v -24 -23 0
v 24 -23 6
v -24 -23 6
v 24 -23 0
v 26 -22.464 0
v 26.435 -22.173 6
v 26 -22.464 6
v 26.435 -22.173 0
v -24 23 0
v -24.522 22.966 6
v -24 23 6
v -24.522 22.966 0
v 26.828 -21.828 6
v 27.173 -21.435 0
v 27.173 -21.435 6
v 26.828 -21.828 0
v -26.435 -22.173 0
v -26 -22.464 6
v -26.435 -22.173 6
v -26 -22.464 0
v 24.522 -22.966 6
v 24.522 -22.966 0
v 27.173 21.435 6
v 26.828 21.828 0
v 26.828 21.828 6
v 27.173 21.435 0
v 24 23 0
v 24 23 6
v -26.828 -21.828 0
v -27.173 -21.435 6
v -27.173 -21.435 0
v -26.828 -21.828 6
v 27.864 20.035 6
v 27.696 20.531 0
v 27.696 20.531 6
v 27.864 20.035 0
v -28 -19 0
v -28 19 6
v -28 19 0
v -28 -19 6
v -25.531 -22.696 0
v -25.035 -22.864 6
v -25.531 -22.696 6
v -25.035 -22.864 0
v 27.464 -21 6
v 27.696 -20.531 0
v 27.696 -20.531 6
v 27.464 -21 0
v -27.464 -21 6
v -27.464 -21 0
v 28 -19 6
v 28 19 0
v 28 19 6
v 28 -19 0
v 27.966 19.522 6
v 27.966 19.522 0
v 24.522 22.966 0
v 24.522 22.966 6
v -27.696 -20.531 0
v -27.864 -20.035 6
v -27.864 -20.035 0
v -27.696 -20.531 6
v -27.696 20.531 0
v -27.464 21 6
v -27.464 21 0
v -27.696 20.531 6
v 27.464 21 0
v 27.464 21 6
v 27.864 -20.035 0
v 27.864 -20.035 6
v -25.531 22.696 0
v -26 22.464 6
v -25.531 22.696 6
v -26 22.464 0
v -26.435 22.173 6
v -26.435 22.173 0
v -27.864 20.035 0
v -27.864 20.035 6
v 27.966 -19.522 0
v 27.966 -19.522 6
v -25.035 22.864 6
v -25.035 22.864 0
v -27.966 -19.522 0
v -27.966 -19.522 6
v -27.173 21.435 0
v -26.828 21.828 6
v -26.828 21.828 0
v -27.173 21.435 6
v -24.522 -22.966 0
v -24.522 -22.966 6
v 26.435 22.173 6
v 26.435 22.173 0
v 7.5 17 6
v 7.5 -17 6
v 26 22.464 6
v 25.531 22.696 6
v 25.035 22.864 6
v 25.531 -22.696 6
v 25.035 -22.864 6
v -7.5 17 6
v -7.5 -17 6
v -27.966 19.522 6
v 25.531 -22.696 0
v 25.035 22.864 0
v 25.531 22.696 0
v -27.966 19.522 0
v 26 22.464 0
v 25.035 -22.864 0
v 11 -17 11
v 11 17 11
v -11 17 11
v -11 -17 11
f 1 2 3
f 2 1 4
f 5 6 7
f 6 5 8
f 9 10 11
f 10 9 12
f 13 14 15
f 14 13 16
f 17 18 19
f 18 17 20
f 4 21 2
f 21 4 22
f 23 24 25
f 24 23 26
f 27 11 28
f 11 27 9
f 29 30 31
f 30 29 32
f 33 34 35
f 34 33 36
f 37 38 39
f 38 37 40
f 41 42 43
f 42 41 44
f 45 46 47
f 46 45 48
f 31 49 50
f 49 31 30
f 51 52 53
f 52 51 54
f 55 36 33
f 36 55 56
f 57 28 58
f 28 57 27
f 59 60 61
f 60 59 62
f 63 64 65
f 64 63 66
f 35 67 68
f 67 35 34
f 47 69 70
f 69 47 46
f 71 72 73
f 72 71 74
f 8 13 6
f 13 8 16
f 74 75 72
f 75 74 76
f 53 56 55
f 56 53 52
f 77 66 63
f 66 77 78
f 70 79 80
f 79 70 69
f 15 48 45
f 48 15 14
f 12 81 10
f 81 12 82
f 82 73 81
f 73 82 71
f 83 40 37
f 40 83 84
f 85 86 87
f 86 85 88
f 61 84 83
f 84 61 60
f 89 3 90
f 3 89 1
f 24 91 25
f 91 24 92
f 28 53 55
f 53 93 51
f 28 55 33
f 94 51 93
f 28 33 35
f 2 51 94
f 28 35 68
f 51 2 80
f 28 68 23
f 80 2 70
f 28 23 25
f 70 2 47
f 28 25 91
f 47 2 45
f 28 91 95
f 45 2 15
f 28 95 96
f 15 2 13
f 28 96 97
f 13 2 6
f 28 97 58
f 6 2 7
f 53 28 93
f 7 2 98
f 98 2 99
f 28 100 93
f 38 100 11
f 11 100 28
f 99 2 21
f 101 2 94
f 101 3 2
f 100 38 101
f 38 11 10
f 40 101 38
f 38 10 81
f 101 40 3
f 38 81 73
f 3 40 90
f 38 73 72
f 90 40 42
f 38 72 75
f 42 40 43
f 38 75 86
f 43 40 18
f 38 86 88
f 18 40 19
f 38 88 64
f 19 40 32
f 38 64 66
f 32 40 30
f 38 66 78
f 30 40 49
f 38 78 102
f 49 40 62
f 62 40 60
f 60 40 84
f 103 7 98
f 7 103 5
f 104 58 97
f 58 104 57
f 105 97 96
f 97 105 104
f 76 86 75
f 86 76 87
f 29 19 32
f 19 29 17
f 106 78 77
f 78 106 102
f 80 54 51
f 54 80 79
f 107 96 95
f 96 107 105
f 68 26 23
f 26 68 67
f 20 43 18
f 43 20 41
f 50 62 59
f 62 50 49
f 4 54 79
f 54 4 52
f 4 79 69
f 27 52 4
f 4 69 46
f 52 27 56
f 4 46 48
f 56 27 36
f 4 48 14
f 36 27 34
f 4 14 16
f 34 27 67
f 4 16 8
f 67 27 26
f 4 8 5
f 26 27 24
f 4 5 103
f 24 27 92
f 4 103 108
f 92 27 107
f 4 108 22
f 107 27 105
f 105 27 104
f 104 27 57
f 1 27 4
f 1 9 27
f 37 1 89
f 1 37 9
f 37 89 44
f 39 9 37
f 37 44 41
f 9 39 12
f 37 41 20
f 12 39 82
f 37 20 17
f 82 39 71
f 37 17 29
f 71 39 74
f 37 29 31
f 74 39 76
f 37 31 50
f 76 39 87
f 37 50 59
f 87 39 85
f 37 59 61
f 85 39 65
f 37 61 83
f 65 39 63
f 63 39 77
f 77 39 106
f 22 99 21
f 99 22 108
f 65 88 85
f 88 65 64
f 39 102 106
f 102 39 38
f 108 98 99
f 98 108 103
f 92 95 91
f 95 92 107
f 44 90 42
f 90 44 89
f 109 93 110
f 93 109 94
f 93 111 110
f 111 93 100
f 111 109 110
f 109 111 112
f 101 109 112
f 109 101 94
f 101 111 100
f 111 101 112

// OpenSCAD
// file: dovetail.scad
/*
  dovetail.scad - the male/female interface, defined ONCE.

  ---------------------------------------------------------------------------
  ★ WHY THIS FILE EXISTS

  These constants are needed by two files: mount.scad makes the male, case.scad
  cuts the female. They must agree exactly or the parts do not fit.

  They used to live in mount.scad, which case.scad pulled in with `use`. That
  does not work, and it fails SILENTLY:

    - `use` imports modules but NOT variables. So `dt_h` read from case.scad is
      undef, and any arithmetic on it silently produces nonsense.
    - Worse, case.scad can declare its own dt_* variables in the same
      namespace. A maintainer "documenting the dovetail" in case.scad gets a
      file that reads correctly, renders without a warning, and is wrong. That
      was tested: setting dt_h = 12 in case.scad left the slot cut at 6.0.

  A dimensional audit named this as the highest-risk drift pair in the project.
  So the constants live here, both files `include` this, and there is exactly
  one place to change them.

  ★ NEVER copy a value out of this file into another one. Include it.
*/

// ============================================================ CONSTANTS

/*
  ★ NARROWED from 26/34/6 after a review found the mount plate lid screws
  breaking into the slot: at dt_top 34 the slot half-width was 17.3 while the
  screws inner edge sat at 16.3 - a 1.0 mm intersection, on four screws.

  15/22 over 5 gives a slot half-width of 11.55 and 4.75 mm of clearance. The
  flank is atan(5 / 3.5) = 55 degrees, still self-supporting, and the joint is
  hugely overbuilt either way - a structural review put the dovetail root at
  SF 20 in the direction that matters.
*/
dt_base   = 15.0;   // narrow face, against the plate
dt_top    = 22.0;   // wide face - the part that cannot be pulled straight out
dt_h      = 5.0;
dt_len    = 34.0;
dt_clear  = 0.30;   // printed fit, per face. See the sweep note below.

/*
  ★ PRINT THE SWEEP, NOT A FIT TEST.

  The usual advice is "print a test coupon, judge it, adjust, reprint". That
  assumes iteration, and there is exactly one print here.

  So print the male plate THREE times at dt_clear 0.20 / 0.30 / 0.45, each with
  its number embossed on the face. Try all three, keep the one that slides with
  a firm thumb push and does not rock, and put the other two in the tail bag as
  road spares. About 30 g of filament, and it converts a number that has to be
  guessed right into one that is simply selected.
*/

// ============================================================ PROFILE

/*
  ★ ONE profile, grown by offset() for the female.

  The first version added dt_clear as a pure X offset to the polygon's corners
  while also raising the top by dt_clear. That adds rise without run, so the
  female flank was NOT parallel to the male's - 0.255 mm of clearance at the
  root and 0.091 mm at the tip. 0.091 is inside a normal printer's error before
  elephant's foot is counted, so it would have bound at the tip while being
  sloppy at the root, and raising dt_clear could never fix both at once.

  offset(delta) moves every edge along its own normal, so the flanks stay
  exactly parallel and the clearance is uniform. Verified: at delta = 0.30 the
  slope stays 4.4/6.6 = 0.6667, identical to the male's 4/6.
*/
module dt_profile(grow = 0) {
    offset(delta = grow)
        polygon([[-dt_base / 2, 0], [ dt_base / 2, 0],
                 [ dt_top  / 2, dt_h], [-dt_top  / 2, dt_h]]);
}

// Male: a straight extruded taper. No undercut, nothing to bridge - which is
// the whole reason this replaced a three-lug bayonet.
module dovetail_male(len = dt_len) {
    translate([0, len / 2, 0]) rotate([90, 0, 0])
        linear_extrude(len) dt_profile(0);
}

/*
  Female. REQUIRES a length - there is no default on purpose.

  Cut at its own length it is a closed rectangular pocket that nothing can ever
  slide into. That mistake has been made three times in this project: on the
  quarter-turn receiver, on the first back-plate, and on the mount plate. It
  renders correctly every time, which is exactly why it keeps surviving
  inspection. Making the argument mandatory forces the caller to think about
  which end is open.
*/
module dovetail_female(len) {
    assert(!is_undef(len),
           "dovetail_female needs a length - and it must run out to an edge, or nothing can slide in");
    translate([0, len / 2, -0.01]) rotate([90, 0, 0])
        linear_extrude(len) dt_profile(dt_clear);
}
// main file
/*
  ==========================================================================
  ★★ SUPERSEDED - DO NOT PRINT FROM THIS FILE. 29 Aug 2026.
  ==========================================================================

  This whole design assumed the printed plate BOLTS THROUGH the BM4's own
  aluminium phone plate, using that plate's existing holes. Two things killed
  it, both reported by the rider with the part in his hand:

    1. THE PLATE IS GLUED ON. It does not come off, so there is nothing to
       bolt through. The four M4 clearance holes and `bolt_d = 4.5` below
       describe an assembly that cannot be made.

    2. THERE IS NO ALUMINIUM. The BM4 is polymer throughout; the only metal
       anywhere in the mount is one ISO 10642 M3 countersunk steel screw.
       Every "aluminium plate" in the text below is wrong.

  Also refuted since: the ★ block warning against printing a mating spline.
  The BM4's plate joint is NOT a Hirth coupling - it is a plain rounded-square
  key, 14.0 mm across flats, 2.17 mm corner radius, 2.0 mm deep, MEASURED. A
  printed square boss is viable. See docs/MOUNT_INTERFACE.md.

  And the load figure: "BM4 arm + plate + adapter 11.0 mm -> 245 N" describes
  an ARM the standard BM4 does not have. The main unit goes straight onto the
  ball. That number is unfounded.

  ★ THE REPLACEMENT IS hardware/mount_v2.scad - the adapter now REPLACES the
  phone plate rather than bolting to it, carries a brass heat-set insert for
  the M3 screw, and locks to the case with a transverse steel pin rather than
  the thumbscrew that has been found broken four separate times.

  Kept only so the reasoning survives. The dovetail geometry and the
  print-orientation notes at the bottom are still sound; nothing else is.
  ==========================================================================

  JiffyTrails mount - ONE printed part.

  Open in OpenSCAD, set `part`, press F6, File > Export > STL.

  ---------------------------------------------------------------------------
  WHAT THIS IS

  A flat plate with the dovetail ridge on top. It bolts to the BOBO BM4's own
  aluminium phone plate. That is the whole mount.

      handlebar -> BM4 clamp -> ball -> collet + collar -> arm
        -> BM4's splined joint + brass thumbscrew   <- untouched, still yours
        -> BM4's aluminium plate                    <- untouched, still yours
        -> THIS PART                                <- the only thing printed
        -> case slides down onto the dovetail, pin locks it

  ---------------------------------------------------------------------------
  ★ WHY THERE IS NO PRINTED BALL CLAMP HERE ANY MORE

  Two earlier versions of this file tried to print one - first a quarter-turn
  bayonet, then a two-piece bolted clamp. Fourteen defects between them, and
  underneath those a result that killed the whole idea: a RIGID printed socket
  has no working size. Bigger than the ball and it touches at the rim with the
  clearance growing as you tighten; smaller and it is two knife edges at
  284 MPa, six times ASA's yield at 60 C; exactly equal and there is no
  interference, so no grip at all.

  All of which was solving a problem that did not exist. The rider has the
  entire BM4 mount - clamp, ball, collet, collar, arm and aluminium plate. Only
  the JAW that grips the phone broke, and we are not using the jaw.

  ★ AND DO NOT PRINT A MATING SPLINE. The BM4's plate joint is a Hirth
  coupling - two discs of radial teeth squeezed by one screw. Hirth halves have
  to be made as a MATCHED PAIR; two separately manufactured halves mismatch and
  lose 50-70% of their capacity, and FDM cannot hold that tooth pitch against
  an injection-moulded mate. Printed Hirth joints do work when BOTH halves are
  printed together - which is not our case. Bolt to the aluminium plate and let
  BOBO's own matched pair do its job.

  ---------------------------------------------------------------------------
  IT ALSO MAKES THE LOAD SMALLER

  The load on the ball is a moment - case weight times its distance from the
  ball centre. Keeping BOBO's metal arm and plate gives the shortest stack of
  anything considered:

      two printed cups + dovetail plate     17.0 mm   ->  289 N of clamp force
      one cup with an integral dovetail     31.5 mm   ->  393 N
      THIS: BM4 arm + plate + adapter       11.0 mm   ->  245 N

  So the proven metal ball joint is being asked for about 25% LESS than the
  printed clamp would have needed. Nothing anywhere is stretched.
*/

include <dovetail.scad>

$fn = 48;

// ============================================================ PARAMETERS

plate_w   = 56.0;
plate_l   = 46.0;
plate_t   = 6.0;
plate_r   = 4.0;

/*
  ★ M4 MINIMUM, AND 0.4 N.m MAXIMUM.

  Head bearing stress on ASA, which yields near 15 MPa sustained at 60 C:

      M4 at 0.4 N.m   500 N   14.6 MPa   ok
      M4 at 1.0 N.m  1250 N   36.4 MPa   crushes it
      M4 at 2.0 N.m  2500 N   72.8 MPa   crushes it
      M3 at 0.4 N.m           35.7 MPa   crushes it even at design torque

  So M3 is not "a smaller option", it is wrong. And there is no torque figure
  to hit - nip it up until it stops turning easily and stop. Use nyloc nuts or
  threadlock, because you cannot hold this joint with tension.
*/
bolt_d    = 4.5;    // M4 clearance
cbore_d   = 8.5;    // counterbore so heads sit flush - they foul the case
cbore_t   = 3.0;    // mount plate otherwise

/*
  AMPS is the industry four-hole pattern: 38 x 30 mm. Screw size is NOT part of
  the standard (M4 and M5 both appear), so drill to fit whatever you have.

  The 38 mm span has to run ACROSS the dovetail - the other way round does not
  fit on this plate.
*/
amps_x    = 19.0;   // 38 mm span, across the dovetail
amps_y    = 15.0;   // 30 mm span, along it

// ============================================================ DERIVED

plate_h   = plate_t + dt_h;

/*
  ★ WHERE IT IS SAFE TO DRILL, if you drill the blank yourself.

  |x| between 12 and 25 mm, ANY y. That keeps clear of the dovetail root on the
  inside and the plate edge on the outside.

  Do NOT drill near the ends. The dovetail runs the full 34 mm, so there is
  only 6 mm of plate beyond it there - not enough for a bolt head.
*/
drill_x_min = dt_top / 2 + 1.0;
drill_x_max = plate_w / 2 - cbore_d / 2 - 2.0;

echo(str("plate ", plate_w, " x ", plate_l, " x ", plate_t, ", total height ", plate_h));
echo(str("safe drilling zone: |x| = ", drill_x_min, " to ", drill_x_max, ", any y"));

// ============================================================ ASSERTS

/*
  Every one of the fourteen defects in the two failed versions of this file was
  a collision or a sign error - not one was a judgement call. These lines are
  the design review, and they run on F5.
*/
assert(drill_x_max > drill_x_min + 4,
       "no usable drilling zone - plate too narrow or dovetail too wide");
assert(amps_x - cbore_d/2 > dt_top/2 + 1.0,
       "AMPS counterbore fouls the dovetail overhang");
assert(amps_x + cbore_d/2 < plate_w/2 - 2.0,
       "AMPS counterbore too close to the plate edge");
assert(amps_y + cbore_d/2 < plate_l/2 - 2.0,
       "AMPS counterbore runs off the end of the plate");
assert(dt_len <= plate_l,
       "dovetail longer than the plate it sits on");
assert(atan(dt_h / ((dt_top - dt_base)/2)) > 45,
       "dovetail flank not self-supporting - it needs support material");
assert(cbore_t < plate_t - 1.5,
       "counterbore leaves too little material under the bolt head");

// ============================================================ PARTS

module rrect(w, l, h, r) {
    hull() for (x = [-1, 1], y = [-1, 1])
        translate([x*(w/2 - r), y*(l/2 - r), 0]) cylinder(h = h, r = r);
}

module plate_body() {
    rrect(plate_w, plate_l, plate_t, plate_r);
    translate([0, 0, plate_t]) dovetail_male(dt_len);
}

/*
  ★ THE ONE TO PRINT. A blank - no holes at all.

  Lay it on the BM4's aluminium plate, mark through that plate's own holes with
  a nail, and drill. A blank fits 100% of bolt patterns with zero measurement,
  which is strictly better than any pattern guessed from a photograph - and it
  means nothing has to be measured before the print goes on the bed.

  Drill 4.5 mm through, then open the top 3 mm with an 8 mm bit so the heads
  sit flush. Or use countersunk M4. Proud heads foul the case's mount plate.
*/
module adapter_blank() {
    plate_body();
}

/*
  Fallback, if the aluminium plate turns out unusable and a commercial 17 mm
  ball AMPS plate is bought instead (~800-1200 rupees, fully known numbers).
*/
module adapter_amps() {
    difference() {
        plate_body();
        for (x = [-1, 1], y = [-1, 1]) translate([x*amps_x, y*amps_y, -0.1]) {
            cylinder(h = plate_h + 1, d = bolt_d);
            cylinder(h = cbore_t + 0.1, d = cbore_d);
        }
    }
}

// A 14 mm slice, printed in the SAME orientation on the SAME plate, so it can
// be tried in each mount-plate variant by hand before anything is bolted up.
module dovetail_stub() {
    intersection() {
        plate_body();
        translate([-plate_w, -7, -1]) cube([2*plate_w, 14, plate_h + 2]);
    }
}

// ============================================================ LAYOUT

part = "blank";   // "blank" "amps" "stub" "all"

if      (part == "blank") adapter_blank();
else if (part == "amps")  adapter_amps();
else if (part == "stub")  dovetail_stub();
else {
    adapter_blank();
    translate([plate_w + 8, 0, 0]) adapter_amps();
    translate([0, plate_l + 10, 0]) dovetail_stub();
}

/*
  ★ PRINT ORIENTATION: FLAT, DOVETAIL UP. No supports, and none are needed.

  The dovetail's flanks sit at 55 degrees from horizontal, comfortably
  self-supporting. Layers then run in the plate's plane, so the bending load is
  along them - the strong direction - rather than across them.

  0.2 mm layers, 5 perimeters, 40% infill. About 17 g each.

  ---------------------------------------------------------------------------
  ★ ONE THING THE PIVOT COST US, AND HOW TO GET IT BACK

  The abandoned printed clamp carried a 2 mm butyl liner, and that rubber was
  doing real damping - it cut the assembly's resonant Q from about 50 to about
  7. Bolting metal to plastic gets none of that.

  case.scad already puts foam in the dovetail slot, which helps. Add a thin
  rubber sheet between this plate and the BM4's aluminium one as well. Cut it
  from the same inner tube, it costs nothing, and it recovers most of what the
  liner was doing.
*/
